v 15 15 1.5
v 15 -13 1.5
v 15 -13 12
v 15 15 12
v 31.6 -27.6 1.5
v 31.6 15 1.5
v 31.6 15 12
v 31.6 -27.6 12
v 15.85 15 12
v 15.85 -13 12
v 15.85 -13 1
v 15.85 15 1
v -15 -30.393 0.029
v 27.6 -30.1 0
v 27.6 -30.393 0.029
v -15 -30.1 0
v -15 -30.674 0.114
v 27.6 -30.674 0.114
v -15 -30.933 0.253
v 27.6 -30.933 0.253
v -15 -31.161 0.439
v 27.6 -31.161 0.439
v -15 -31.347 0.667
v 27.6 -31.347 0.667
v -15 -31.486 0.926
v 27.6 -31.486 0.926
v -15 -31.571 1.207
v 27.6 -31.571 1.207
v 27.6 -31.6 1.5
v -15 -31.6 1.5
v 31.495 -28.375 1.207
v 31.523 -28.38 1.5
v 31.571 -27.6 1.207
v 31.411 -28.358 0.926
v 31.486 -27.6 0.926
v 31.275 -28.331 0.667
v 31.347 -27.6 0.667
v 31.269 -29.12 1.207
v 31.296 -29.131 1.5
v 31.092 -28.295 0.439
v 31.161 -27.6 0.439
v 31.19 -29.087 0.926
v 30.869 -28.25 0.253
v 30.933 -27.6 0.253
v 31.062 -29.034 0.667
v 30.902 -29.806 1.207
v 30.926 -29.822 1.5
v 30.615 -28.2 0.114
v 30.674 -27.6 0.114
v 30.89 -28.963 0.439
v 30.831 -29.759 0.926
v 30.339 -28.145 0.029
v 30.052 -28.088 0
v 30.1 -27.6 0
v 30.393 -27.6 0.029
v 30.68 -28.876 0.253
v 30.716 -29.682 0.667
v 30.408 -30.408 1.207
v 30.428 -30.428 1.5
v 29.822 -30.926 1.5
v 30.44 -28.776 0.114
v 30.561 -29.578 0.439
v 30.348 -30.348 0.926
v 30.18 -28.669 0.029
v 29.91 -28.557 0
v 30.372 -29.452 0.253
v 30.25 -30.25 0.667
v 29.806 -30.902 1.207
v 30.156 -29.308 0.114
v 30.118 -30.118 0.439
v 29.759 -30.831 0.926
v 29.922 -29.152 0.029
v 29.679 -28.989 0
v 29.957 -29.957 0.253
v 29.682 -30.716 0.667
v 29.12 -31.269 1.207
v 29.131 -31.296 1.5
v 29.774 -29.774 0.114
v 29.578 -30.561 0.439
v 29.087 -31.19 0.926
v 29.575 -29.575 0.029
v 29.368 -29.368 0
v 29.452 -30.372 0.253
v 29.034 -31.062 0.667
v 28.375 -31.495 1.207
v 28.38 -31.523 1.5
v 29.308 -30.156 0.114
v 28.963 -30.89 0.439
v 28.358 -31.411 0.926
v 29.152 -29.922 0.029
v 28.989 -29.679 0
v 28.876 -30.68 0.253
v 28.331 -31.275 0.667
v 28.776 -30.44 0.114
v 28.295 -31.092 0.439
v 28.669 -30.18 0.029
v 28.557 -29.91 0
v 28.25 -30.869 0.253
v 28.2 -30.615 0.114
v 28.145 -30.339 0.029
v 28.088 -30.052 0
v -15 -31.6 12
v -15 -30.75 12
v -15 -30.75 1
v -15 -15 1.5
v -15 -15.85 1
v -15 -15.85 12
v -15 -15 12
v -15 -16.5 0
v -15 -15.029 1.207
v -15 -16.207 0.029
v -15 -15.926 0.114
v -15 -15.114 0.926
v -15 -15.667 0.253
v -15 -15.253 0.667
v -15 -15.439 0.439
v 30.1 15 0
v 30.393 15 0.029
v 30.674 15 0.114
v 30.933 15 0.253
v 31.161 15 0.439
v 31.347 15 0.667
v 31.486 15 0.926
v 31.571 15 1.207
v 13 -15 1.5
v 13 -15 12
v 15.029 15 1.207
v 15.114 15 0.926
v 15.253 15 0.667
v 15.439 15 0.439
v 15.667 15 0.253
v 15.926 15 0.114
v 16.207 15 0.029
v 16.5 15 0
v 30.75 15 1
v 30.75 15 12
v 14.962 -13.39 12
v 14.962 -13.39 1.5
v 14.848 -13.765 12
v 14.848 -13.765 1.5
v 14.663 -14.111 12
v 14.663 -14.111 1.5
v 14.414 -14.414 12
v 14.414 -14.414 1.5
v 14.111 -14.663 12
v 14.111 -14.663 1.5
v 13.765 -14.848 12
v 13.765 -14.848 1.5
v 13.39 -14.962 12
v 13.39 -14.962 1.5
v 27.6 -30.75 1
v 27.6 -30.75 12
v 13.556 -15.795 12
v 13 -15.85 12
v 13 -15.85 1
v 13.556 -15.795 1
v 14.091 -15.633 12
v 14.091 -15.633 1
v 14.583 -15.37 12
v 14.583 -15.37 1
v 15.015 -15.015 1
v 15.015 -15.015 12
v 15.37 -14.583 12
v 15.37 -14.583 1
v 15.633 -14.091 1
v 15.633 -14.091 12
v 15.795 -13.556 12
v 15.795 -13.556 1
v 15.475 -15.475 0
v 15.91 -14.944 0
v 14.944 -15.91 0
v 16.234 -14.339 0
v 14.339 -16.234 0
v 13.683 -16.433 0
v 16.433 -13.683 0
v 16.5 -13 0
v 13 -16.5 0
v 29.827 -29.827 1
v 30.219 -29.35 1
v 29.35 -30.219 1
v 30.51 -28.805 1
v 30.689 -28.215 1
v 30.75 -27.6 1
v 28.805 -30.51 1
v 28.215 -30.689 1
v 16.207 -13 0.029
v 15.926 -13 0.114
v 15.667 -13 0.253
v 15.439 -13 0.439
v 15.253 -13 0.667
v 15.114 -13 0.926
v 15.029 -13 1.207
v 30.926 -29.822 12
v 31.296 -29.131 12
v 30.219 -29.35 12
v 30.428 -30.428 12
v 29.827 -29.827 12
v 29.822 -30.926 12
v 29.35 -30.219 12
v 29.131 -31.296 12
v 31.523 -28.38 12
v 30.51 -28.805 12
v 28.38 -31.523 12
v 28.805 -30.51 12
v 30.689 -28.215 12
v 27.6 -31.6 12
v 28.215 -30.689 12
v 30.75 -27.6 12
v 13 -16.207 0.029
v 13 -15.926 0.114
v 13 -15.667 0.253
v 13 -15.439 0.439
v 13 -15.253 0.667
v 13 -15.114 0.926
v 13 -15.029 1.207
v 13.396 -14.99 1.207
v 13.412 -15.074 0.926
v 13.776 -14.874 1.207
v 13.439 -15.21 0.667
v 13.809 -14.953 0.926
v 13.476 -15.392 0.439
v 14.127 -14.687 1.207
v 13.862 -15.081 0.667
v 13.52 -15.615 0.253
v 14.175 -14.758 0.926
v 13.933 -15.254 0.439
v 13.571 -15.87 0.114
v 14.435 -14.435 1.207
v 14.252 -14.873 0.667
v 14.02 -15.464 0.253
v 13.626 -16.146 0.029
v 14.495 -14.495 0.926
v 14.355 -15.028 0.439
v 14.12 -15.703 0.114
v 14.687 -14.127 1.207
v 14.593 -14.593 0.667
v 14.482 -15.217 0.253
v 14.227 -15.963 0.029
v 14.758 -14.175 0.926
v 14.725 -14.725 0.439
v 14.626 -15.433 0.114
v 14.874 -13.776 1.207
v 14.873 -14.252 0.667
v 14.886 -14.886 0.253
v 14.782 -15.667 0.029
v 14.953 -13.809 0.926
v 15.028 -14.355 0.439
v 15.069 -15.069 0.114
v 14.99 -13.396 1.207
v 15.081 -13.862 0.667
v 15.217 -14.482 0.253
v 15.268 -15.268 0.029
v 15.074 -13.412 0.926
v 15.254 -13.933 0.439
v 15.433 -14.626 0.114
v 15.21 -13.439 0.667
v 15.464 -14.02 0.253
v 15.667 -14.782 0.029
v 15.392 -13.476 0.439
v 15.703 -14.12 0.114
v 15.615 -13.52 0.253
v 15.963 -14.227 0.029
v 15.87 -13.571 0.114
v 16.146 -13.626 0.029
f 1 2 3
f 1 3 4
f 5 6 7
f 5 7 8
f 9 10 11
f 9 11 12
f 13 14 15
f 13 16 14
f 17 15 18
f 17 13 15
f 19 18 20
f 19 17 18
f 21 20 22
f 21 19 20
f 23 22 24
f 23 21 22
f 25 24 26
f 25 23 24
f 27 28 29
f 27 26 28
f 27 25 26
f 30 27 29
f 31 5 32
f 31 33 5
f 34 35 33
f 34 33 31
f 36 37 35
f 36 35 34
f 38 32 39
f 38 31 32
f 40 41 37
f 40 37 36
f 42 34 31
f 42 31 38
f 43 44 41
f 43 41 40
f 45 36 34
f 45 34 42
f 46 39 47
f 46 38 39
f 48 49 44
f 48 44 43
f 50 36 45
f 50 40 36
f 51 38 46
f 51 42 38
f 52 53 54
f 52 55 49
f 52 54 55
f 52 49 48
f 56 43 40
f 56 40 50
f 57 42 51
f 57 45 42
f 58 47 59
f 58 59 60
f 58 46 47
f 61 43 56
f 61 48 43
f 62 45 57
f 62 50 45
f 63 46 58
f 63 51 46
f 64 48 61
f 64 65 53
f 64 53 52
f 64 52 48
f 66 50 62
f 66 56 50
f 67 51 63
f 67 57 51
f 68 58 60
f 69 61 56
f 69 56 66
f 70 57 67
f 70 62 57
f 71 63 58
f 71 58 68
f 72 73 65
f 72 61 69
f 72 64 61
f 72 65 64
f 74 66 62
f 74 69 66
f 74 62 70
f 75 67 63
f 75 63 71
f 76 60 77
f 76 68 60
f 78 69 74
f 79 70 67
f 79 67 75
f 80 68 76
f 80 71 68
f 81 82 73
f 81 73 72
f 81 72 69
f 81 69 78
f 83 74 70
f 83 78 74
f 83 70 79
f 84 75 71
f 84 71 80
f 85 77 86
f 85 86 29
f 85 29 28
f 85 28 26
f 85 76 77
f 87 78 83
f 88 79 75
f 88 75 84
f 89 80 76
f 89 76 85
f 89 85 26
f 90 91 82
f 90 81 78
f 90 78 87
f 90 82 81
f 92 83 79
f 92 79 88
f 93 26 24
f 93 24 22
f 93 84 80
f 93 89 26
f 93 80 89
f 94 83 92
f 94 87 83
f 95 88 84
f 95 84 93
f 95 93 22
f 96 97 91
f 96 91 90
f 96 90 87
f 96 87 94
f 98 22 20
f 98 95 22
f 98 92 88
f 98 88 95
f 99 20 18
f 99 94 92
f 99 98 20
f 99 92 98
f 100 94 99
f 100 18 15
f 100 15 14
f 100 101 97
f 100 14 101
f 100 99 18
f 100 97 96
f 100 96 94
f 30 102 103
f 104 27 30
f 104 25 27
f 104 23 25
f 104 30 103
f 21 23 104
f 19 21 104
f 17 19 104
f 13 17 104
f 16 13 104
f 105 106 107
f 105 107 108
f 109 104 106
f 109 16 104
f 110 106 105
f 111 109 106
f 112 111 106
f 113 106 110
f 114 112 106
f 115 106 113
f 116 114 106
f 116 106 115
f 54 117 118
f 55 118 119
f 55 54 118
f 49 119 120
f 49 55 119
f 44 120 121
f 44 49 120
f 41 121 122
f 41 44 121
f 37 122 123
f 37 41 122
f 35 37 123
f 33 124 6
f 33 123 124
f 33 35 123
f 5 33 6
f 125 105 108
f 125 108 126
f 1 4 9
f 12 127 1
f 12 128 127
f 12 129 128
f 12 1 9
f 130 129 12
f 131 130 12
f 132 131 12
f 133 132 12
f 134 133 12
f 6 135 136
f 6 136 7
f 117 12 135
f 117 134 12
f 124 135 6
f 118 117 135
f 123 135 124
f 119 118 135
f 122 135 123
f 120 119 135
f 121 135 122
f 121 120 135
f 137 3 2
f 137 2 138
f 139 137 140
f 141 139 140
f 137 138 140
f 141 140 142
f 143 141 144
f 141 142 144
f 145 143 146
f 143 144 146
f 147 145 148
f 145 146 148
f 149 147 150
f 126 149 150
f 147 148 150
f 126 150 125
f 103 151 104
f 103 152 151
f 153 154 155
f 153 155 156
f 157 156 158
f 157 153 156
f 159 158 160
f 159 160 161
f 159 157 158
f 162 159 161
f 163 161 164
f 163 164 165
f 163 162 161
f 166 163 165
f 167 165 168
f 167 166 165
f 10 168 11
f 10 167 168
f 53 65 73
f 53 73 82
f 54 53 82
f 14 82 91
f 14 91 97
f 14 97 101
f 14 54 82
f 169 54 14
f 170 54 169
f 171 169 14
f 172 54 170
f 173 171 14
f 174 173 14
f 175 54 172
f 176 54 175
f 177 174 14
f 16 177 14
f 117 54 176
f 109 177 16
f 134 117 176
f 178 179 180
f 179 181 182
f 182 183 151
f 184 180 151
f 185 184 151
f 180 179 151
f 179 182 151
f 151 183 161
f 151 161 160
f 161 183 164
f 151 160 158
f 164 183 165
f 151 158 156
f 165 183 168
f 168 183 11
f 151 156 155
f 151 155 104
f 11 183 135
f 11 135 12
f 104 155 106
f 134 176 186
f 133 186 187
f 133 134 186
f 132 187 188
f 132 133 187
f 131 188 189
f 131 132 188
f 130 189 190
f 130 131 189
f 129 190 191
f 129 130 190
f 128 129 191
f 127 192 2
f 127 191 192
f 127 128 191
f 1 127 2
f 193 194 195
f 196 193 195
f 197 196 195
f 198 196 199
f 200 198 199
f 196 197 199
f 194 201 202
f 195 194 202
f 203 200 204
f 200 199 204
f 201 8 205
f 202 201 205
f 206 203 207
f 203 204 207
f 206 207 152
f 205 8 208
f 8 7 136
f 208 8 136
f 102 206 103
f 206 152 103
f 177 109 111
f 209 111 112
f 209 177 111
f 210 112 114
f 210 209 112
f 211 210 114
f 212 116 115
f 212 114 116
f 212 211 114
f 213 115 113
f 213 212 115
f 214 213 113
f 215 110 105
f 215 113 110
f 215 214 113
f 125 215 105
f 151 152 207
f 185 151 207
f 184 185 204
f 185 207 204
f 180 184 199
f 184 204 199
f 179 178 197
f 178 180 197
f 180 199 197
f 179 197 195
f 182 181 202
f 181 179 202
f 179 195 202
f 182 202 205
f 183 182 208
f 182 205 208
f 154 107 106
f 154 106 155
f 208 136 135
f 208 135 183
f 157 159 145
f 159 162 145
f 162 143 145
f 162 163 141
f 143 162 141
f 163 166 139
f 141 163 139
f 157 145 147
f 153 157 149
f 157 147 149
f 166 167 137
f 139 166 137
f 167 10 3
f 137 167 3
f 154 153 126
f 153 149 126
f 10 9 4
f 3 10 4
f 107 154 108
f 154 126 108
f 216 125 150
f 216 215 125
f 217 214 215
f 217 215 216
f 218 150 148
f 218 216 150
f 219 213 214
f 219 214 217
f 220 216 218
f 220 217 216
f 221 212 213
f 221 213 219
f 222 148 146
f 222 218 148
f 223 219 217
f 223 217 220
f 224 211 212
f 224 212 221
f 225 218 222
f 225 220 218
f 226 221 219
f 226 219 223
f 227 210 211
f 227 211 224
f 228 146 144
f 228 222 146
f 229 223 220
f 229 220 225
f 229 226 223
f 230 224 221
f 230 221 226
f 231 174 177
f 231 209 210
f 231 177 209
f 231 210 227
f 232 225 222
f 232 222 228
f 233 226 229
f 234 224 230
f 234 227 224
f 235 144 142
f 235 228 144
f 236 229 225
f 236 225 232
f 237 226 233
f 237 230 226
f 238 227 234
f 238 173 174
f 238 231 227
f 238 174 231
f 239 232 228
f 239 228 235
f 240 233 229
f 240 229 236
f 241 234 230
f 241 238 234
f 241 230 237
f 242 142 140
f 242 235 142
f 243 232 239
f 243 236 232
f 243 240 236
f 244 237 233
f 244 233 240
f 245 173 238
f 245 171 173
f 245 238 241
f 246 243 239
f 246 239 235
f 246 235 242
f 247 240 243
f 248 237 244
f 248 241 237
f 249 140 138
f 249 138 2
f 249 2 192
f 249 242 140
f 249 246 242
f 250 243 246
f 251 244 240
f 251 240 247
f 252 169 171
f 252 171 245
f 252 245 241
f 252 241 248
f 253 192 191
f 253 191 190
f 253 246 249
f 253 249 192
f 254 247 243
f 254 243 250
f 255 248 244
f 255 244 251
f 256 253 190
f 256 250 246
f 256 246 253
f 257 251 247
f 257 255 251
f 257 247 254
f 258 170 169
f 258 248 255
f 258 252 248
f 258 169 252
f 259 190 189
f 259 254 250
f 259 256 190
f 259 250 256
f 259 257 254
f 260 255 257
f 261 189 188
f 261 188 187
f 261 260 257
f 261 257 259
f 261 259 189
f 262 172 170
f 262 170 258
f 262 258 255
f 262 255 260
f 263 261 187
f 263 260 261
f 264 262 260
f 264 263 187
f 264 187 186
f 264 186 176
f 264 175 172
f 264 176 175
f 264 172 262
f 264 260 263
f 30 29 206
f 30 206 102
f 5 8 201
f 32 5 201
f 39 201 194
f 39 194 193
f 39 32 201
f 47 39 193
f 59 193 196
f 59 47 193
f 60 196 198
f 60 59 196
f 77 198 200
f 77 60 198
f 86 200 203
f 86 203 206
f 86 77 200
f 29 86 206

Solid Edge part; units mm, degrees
sketch "Sketch1" plane through (0, 0, 0) normal (0, 0, 1) x (1, 0, 0)
  line L0 (27.6, -31.6) -> (-15, -31.6)
  line L1 (-15, -31.6) -> (-15, -15)
  line L2 (-15, -15) -> (13, -15)
  arc A0 (15, -13) -> (13, -15) centre (13, -13) cw
  line L3 (15, -13) -> (15, 15)
  line L4 (15, 15) -> (31.6, 15)
  line L5 (31.6, 15) -> (31.6, -27.6)
  arc A1 (31.6, -27.6) -> (27.6, -31.6) centre (27.6, -27.6) cw
extrude "Protrusion1" add sketch "Sketch1" along normal blind 12
fillet "Rotondo_1" radius 1.5 6 edges at (6.3, -31.6, 0) (30.4284, -30.4284, 0) (31.6, -6.3, 0) (-1, -15, 0) (14.4142, -14.4142, 0) (15, 1, 0)
sketch "Sketch2" plane through (7.5, -7.5, 12) normal (0, 0, 1) x (0, 1, 0)
  line L0 (26.8363, -8.35) -> (26.8363, -23.25)
  line L1 (26.8363, -23.25) -> (21.4, -23.25)
  line L2 (21.4, -23.25) -> (-20.1, -23.25)
  arc A0 (-20.1, -23.25) -> (-23.25, -20.1) centre (-20.1, -20.1) cw
  line L3 (-23.25, -20.1) -> (-23.25, 21.4)
  line L4 (-23.25, 21.4) -> (-23.25, 26.0258)
  line L5 (-23.25, 26.0258) -> (-8.35, 26.0258)
  line L6 (-8.35, 26.0258) -> (-8.35, 21.4)
  line L7 (-8.35, 21.4) -> (-8.35, -5.5)
  arc A1 (-8.35, -5.5) -> (-5.5, -8.35) centre (-5.5, -5.5) ccw
  line L8 (-5.5, -8.35) -> (21.4, -8.35)
  line L9 (21.4, -8.35) -> (26.8363, -8.35)
  dimension "D1" = 0.85
extrude "ScavoEstrusione_3" cut sketch "Sketch2" against normal blind 11
